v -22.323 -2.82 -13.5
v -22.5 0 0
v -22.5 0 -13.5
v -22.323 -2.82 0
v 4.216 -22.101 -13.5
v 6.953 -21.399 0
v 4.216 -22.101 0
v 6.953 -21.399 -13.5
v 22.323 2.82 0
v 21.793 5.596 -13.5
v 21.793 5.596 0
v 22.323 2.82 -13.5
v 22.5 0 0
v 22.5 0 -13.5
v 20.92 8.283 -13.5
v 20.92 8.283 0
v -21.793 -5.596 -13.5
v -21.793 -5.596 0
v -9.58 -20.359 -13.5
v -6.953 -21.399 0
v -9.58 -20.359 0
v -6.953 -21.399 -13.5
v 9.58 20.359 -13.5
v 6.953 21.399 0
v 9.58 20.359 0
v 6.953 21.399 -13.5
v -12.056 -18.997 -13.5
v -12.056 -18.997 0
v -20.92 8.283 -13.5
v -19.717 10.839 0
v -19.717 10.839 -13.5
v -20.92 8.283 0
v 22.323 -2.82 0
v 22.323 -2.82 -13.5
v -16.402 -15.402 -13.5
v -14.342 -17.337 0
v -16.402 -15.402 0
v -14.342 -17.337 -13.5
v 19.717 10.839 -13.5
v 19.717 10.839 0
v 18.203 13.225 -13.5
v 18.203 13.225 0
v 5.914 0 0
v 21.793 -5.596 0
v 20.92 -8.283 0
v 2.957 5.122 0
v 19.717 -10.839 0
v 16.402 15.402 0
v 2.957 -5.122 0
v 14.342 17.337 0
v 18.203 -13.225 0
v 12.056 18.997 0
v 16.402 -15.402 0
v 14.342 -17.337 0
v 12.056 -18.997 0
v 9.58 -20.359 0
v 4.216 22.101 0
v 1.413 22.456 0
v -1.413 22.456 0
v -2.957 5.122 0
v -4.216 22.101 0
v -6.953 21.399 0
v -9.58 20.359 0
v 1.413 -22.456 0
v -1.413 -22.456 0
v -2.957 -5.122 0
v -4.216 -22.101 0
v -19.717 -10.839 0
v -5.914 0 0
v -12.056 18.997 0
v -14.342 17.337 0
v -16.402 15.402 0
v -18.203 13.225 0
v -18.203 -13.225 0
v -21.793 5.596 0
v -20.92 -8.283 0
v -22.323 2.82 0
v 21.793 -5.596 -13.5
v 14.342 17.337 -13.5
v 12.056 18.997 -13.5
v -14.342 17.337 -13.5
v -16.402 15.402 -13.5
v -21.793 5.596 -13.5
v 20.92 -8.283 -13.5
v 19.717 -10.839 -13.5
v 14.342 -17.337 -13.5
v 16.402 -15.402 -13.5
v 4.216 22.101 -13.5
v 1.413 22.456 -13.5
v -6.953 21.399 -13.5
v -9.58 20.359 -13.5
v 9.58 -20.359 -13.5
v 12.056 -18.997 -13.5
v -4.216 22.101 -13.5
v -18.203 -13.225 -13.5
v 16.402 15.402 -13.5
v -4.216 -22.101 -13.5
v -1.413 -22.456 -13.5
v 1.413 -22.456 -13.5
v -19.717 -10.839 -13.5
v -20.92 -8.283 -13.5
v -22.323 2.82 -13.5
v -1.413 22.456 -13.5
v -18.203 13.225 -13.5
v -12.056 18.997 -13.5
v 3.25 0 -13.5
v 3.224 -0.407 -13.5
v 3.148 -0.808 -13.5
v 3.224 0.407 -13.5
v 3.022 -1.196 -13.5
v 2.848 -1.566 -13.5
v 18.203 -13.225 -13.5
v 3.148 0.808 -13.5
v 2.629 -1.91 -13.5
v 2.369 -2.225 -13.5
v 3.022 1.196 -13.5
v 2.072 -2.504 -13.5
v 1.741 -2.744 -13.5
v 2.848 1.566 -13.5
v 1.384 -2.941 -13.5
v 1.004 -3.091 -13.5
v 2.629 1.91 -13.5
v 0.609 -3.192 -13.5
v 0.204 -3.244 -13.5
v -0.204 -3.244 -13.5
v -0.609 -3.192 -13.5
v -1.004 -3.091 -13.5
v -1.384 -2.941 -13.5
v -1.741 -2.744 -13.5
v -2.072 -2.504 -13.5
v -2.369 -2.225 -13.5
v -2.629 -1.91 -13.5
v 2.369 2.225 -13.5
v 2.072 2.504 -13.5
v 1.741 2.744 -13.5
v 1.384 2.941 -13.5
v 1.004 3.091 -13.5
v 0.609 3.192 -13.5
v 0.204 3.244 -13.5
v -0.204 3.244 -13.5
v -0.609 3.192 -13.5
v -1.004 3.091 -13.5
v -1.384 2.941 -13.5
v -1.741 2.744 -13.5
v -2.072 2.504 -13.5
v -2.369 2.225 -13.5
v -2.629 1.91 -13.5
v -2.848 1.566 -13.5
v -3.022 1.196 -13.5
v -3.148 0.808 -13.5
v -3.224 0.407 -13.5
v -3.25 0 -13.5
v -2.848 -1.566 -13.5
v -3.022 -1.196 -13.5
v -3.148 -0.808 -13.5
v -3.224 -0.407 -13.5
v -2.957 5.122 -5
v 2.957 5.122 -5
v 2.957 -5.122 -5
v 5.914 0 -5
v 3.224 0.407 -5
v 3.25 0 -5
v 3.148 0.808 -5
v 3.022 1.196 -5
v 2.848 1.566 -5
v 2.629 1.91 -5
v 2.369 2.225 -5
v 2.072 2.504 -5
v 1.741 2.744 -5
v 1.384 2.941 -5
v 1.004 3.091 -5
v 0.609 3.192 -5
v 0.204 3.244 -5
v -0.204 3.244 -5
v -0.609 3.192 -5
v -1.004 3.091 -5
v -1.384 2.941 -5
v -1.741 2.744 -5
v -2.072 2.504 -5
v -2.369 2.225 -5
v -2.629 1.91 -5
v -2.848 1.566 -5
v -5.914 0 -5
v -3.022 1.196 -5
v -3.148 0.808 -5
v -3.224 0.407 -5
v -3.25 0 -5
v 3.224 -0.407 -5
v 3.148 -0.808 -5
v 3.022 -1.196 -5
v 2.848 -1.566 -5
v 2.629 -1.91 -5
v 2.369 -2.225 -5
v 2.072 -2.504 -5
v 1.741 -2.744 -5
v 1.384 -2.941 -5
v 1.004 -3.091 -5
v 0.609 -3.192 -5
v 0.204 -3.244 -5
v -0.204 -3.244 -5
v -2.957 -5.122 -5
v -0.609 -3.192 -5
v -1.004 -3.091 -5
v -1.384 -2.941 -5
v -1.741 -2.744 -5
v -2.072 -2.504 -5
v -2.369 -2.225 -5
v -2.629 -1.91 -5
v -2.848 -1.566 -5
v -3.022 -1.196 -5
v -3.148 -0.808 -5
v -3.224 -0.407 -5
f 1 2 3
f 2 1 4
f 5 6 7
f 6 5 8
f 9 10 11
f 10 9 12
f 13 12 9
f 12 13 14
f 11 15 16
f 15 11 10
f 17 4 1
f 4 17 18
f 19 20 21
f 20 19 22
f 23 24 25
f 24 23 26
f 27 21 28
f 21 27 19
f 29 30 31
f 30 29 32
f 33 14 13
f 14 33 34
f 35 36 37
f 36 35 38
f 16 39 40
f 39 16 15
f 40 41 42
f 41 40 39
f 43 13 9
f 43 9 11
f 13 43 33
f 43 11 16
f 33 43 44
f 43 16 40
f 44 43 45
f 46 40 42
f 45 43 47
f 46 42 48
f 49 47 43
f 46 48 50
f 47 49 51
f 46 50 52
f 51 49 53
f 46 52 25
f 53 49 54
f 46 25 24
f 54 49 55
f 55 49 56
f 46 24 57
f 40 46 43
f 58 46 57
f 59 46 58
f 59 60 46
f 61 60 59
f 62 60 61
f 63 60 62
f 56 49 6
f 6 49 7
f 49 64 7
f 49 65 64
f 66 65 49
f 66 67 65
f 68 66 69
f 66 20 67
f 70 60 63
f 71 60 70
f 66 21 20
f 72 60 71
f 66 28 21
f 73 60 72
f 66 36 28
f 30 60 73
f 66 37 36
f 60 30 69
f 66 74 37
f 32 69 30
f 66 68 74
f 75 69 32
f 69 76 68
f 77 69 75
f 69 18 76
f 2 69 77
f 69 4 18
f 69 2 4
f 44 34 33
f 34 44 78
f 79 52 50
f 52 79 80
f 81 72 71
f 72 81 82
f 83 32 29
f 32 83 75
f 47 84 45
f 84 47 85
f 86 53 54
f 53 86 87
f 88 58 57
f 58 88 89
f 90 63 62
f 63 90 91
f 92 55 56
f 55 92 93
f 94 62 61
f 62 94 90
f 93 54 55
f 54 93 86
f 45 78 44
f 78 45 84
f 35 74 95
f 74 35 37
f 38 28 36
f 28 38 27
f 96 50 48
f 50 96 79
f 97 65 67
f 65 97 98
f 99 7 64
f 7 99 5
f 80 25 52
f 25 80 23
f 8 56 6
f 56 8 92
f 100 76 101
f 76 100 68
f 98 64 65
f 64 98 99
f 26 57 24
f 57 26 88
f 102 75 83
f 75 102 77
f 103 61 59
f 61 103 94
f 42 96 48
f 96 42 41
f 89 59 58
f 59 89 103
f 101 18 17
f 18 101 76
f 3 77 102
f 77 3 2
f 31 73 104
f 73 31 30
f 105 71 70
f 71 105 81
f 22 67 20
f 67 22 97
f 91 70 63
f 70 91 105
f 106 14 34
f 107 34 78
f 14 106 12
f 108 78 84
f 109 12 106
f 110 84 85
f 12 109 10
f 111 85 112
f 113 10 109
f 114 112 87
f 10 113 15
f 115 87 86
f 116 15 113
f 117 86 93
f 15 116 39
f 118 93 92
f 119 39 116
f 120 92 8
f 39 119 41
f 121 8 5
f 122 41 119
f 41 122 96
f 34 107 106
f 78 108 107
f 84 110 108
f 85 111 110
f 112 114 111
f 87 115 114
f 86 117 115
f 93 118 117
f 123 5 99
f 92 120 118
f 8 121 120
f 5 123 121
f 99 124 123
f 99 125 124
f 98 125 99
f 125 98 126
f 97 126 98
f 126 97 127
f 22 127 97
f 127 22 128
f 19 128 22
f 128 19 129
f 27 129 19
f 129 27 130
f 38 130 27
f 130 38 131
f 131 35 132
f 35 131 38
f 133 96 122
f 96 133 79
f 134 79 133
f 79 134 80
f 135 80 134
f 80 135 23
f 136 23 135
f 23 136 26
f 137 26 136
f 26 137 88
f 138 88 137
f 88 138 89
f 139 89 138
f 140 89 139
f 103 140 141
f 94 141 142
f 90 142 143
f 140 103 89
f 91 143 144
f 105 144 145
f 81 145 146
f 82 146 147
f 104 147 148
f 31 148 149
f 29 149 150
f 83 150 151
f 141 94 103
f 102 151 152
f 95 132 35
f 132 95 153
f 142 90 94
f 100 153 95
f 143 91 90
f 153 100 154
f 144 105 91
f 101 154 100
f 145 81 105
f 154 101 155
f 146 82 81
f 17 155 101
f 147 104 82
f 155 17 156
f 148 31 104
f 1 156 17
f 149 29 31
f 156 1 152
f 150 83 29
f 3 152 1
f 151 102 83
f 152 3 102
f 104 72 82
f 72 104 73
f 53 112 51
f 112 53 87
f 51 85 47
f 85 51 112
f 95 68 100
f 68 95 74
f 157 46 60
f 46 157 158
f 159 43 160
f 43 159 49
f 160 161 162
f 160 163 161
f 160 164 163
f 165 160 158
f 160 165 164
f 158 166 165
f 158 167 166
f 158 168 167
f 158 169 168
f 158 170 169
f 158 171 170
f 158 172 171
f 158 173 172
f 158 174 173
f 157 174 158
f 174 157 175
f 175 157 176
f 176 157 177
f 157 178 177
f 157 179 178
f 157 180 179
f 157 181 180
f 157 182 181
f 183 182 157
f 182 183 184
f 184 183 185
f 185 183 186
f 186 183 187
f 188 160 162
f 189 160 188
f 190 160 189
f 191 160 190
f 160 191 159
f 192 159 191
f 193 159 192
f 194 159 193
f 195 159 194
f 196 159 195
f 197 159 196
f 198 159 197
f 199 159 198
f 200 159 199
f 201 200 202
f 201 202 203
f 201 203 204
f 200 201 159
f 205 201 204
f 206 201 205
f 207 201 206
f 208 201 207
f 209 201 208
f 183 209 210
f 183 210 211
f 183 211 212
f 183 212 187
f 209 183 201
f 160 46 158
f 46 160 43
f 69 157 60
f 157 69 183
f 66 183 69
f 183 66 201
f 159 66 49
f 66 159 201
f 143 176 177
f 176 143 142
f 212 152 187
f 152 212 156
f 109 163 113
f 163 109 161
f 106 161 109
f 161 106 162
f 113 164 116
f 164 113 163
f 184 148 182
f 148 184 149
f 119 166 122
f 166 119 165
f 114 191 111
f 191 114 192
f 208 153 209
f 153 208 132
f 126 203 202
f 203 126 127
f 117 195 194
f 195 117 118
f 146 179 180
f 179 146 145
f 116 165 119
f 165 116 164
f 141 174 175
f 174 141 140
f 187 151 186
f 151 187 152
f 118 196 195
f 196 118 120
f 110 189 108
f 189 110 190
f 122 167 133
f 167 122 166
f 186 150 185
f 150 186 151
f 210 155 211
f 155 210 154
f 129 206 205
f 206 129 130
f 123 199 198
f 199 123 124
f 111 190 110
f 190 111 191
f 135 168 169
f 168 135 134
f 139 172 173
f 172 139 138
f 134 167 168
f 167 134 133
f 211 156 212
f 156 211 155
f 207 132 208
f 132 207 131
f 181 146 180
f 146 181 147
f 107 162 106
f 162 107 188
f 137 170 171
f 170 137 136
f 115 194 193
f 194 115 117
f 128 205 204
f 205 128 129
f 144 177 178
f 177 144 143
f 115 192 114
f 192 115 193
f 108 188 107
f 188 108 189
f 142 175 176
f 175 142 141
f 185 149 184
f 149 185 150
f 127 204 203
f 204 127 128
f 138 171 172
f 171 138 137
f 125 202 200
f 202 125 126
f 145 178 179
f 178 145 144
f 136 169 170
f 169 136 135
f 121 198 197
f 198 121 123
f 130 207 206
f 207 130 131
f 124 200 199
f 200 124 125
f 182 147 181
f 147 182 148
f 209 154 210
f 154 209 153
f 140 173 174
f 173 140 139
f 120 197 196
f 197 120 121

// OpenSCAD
$fn = 50;


difference() {
	union() {
		translate(v = [0, 0, -13.5000000000]) {
			cylinder(h = 13.5000000000, r = 22.5000000000);
		}
		translate(v = [0, 0, -12.0000000000]) {
			cylinder(h = 12, r = 2.8750000000);
		}
	}
	union() {
		translate(v = [0, 0, 0]) {
			rotate(a = [0, 0, 0]) {
				difference() {
					union() {
						translate(v = [0, 0, -5]) {
							linear_extrude(height = 5) {
								polygon(points = [[5.9142500000, 0.0000000000], [2.9571250000, 5.1218907443], [-2.9571250000, 5.1218907443], [-5.9142500000, 0.0000000000], [-2.9571250000, -5.1218907443], [2.9571250000, -5.1218907443]]);
							}
						}
					}
					union();
				}
			}
		}
		#translate(v = [0, 0, -100.0000000000]) {
			cylinder(h = 200, r = 3.2500000000);
		}
	}
}
